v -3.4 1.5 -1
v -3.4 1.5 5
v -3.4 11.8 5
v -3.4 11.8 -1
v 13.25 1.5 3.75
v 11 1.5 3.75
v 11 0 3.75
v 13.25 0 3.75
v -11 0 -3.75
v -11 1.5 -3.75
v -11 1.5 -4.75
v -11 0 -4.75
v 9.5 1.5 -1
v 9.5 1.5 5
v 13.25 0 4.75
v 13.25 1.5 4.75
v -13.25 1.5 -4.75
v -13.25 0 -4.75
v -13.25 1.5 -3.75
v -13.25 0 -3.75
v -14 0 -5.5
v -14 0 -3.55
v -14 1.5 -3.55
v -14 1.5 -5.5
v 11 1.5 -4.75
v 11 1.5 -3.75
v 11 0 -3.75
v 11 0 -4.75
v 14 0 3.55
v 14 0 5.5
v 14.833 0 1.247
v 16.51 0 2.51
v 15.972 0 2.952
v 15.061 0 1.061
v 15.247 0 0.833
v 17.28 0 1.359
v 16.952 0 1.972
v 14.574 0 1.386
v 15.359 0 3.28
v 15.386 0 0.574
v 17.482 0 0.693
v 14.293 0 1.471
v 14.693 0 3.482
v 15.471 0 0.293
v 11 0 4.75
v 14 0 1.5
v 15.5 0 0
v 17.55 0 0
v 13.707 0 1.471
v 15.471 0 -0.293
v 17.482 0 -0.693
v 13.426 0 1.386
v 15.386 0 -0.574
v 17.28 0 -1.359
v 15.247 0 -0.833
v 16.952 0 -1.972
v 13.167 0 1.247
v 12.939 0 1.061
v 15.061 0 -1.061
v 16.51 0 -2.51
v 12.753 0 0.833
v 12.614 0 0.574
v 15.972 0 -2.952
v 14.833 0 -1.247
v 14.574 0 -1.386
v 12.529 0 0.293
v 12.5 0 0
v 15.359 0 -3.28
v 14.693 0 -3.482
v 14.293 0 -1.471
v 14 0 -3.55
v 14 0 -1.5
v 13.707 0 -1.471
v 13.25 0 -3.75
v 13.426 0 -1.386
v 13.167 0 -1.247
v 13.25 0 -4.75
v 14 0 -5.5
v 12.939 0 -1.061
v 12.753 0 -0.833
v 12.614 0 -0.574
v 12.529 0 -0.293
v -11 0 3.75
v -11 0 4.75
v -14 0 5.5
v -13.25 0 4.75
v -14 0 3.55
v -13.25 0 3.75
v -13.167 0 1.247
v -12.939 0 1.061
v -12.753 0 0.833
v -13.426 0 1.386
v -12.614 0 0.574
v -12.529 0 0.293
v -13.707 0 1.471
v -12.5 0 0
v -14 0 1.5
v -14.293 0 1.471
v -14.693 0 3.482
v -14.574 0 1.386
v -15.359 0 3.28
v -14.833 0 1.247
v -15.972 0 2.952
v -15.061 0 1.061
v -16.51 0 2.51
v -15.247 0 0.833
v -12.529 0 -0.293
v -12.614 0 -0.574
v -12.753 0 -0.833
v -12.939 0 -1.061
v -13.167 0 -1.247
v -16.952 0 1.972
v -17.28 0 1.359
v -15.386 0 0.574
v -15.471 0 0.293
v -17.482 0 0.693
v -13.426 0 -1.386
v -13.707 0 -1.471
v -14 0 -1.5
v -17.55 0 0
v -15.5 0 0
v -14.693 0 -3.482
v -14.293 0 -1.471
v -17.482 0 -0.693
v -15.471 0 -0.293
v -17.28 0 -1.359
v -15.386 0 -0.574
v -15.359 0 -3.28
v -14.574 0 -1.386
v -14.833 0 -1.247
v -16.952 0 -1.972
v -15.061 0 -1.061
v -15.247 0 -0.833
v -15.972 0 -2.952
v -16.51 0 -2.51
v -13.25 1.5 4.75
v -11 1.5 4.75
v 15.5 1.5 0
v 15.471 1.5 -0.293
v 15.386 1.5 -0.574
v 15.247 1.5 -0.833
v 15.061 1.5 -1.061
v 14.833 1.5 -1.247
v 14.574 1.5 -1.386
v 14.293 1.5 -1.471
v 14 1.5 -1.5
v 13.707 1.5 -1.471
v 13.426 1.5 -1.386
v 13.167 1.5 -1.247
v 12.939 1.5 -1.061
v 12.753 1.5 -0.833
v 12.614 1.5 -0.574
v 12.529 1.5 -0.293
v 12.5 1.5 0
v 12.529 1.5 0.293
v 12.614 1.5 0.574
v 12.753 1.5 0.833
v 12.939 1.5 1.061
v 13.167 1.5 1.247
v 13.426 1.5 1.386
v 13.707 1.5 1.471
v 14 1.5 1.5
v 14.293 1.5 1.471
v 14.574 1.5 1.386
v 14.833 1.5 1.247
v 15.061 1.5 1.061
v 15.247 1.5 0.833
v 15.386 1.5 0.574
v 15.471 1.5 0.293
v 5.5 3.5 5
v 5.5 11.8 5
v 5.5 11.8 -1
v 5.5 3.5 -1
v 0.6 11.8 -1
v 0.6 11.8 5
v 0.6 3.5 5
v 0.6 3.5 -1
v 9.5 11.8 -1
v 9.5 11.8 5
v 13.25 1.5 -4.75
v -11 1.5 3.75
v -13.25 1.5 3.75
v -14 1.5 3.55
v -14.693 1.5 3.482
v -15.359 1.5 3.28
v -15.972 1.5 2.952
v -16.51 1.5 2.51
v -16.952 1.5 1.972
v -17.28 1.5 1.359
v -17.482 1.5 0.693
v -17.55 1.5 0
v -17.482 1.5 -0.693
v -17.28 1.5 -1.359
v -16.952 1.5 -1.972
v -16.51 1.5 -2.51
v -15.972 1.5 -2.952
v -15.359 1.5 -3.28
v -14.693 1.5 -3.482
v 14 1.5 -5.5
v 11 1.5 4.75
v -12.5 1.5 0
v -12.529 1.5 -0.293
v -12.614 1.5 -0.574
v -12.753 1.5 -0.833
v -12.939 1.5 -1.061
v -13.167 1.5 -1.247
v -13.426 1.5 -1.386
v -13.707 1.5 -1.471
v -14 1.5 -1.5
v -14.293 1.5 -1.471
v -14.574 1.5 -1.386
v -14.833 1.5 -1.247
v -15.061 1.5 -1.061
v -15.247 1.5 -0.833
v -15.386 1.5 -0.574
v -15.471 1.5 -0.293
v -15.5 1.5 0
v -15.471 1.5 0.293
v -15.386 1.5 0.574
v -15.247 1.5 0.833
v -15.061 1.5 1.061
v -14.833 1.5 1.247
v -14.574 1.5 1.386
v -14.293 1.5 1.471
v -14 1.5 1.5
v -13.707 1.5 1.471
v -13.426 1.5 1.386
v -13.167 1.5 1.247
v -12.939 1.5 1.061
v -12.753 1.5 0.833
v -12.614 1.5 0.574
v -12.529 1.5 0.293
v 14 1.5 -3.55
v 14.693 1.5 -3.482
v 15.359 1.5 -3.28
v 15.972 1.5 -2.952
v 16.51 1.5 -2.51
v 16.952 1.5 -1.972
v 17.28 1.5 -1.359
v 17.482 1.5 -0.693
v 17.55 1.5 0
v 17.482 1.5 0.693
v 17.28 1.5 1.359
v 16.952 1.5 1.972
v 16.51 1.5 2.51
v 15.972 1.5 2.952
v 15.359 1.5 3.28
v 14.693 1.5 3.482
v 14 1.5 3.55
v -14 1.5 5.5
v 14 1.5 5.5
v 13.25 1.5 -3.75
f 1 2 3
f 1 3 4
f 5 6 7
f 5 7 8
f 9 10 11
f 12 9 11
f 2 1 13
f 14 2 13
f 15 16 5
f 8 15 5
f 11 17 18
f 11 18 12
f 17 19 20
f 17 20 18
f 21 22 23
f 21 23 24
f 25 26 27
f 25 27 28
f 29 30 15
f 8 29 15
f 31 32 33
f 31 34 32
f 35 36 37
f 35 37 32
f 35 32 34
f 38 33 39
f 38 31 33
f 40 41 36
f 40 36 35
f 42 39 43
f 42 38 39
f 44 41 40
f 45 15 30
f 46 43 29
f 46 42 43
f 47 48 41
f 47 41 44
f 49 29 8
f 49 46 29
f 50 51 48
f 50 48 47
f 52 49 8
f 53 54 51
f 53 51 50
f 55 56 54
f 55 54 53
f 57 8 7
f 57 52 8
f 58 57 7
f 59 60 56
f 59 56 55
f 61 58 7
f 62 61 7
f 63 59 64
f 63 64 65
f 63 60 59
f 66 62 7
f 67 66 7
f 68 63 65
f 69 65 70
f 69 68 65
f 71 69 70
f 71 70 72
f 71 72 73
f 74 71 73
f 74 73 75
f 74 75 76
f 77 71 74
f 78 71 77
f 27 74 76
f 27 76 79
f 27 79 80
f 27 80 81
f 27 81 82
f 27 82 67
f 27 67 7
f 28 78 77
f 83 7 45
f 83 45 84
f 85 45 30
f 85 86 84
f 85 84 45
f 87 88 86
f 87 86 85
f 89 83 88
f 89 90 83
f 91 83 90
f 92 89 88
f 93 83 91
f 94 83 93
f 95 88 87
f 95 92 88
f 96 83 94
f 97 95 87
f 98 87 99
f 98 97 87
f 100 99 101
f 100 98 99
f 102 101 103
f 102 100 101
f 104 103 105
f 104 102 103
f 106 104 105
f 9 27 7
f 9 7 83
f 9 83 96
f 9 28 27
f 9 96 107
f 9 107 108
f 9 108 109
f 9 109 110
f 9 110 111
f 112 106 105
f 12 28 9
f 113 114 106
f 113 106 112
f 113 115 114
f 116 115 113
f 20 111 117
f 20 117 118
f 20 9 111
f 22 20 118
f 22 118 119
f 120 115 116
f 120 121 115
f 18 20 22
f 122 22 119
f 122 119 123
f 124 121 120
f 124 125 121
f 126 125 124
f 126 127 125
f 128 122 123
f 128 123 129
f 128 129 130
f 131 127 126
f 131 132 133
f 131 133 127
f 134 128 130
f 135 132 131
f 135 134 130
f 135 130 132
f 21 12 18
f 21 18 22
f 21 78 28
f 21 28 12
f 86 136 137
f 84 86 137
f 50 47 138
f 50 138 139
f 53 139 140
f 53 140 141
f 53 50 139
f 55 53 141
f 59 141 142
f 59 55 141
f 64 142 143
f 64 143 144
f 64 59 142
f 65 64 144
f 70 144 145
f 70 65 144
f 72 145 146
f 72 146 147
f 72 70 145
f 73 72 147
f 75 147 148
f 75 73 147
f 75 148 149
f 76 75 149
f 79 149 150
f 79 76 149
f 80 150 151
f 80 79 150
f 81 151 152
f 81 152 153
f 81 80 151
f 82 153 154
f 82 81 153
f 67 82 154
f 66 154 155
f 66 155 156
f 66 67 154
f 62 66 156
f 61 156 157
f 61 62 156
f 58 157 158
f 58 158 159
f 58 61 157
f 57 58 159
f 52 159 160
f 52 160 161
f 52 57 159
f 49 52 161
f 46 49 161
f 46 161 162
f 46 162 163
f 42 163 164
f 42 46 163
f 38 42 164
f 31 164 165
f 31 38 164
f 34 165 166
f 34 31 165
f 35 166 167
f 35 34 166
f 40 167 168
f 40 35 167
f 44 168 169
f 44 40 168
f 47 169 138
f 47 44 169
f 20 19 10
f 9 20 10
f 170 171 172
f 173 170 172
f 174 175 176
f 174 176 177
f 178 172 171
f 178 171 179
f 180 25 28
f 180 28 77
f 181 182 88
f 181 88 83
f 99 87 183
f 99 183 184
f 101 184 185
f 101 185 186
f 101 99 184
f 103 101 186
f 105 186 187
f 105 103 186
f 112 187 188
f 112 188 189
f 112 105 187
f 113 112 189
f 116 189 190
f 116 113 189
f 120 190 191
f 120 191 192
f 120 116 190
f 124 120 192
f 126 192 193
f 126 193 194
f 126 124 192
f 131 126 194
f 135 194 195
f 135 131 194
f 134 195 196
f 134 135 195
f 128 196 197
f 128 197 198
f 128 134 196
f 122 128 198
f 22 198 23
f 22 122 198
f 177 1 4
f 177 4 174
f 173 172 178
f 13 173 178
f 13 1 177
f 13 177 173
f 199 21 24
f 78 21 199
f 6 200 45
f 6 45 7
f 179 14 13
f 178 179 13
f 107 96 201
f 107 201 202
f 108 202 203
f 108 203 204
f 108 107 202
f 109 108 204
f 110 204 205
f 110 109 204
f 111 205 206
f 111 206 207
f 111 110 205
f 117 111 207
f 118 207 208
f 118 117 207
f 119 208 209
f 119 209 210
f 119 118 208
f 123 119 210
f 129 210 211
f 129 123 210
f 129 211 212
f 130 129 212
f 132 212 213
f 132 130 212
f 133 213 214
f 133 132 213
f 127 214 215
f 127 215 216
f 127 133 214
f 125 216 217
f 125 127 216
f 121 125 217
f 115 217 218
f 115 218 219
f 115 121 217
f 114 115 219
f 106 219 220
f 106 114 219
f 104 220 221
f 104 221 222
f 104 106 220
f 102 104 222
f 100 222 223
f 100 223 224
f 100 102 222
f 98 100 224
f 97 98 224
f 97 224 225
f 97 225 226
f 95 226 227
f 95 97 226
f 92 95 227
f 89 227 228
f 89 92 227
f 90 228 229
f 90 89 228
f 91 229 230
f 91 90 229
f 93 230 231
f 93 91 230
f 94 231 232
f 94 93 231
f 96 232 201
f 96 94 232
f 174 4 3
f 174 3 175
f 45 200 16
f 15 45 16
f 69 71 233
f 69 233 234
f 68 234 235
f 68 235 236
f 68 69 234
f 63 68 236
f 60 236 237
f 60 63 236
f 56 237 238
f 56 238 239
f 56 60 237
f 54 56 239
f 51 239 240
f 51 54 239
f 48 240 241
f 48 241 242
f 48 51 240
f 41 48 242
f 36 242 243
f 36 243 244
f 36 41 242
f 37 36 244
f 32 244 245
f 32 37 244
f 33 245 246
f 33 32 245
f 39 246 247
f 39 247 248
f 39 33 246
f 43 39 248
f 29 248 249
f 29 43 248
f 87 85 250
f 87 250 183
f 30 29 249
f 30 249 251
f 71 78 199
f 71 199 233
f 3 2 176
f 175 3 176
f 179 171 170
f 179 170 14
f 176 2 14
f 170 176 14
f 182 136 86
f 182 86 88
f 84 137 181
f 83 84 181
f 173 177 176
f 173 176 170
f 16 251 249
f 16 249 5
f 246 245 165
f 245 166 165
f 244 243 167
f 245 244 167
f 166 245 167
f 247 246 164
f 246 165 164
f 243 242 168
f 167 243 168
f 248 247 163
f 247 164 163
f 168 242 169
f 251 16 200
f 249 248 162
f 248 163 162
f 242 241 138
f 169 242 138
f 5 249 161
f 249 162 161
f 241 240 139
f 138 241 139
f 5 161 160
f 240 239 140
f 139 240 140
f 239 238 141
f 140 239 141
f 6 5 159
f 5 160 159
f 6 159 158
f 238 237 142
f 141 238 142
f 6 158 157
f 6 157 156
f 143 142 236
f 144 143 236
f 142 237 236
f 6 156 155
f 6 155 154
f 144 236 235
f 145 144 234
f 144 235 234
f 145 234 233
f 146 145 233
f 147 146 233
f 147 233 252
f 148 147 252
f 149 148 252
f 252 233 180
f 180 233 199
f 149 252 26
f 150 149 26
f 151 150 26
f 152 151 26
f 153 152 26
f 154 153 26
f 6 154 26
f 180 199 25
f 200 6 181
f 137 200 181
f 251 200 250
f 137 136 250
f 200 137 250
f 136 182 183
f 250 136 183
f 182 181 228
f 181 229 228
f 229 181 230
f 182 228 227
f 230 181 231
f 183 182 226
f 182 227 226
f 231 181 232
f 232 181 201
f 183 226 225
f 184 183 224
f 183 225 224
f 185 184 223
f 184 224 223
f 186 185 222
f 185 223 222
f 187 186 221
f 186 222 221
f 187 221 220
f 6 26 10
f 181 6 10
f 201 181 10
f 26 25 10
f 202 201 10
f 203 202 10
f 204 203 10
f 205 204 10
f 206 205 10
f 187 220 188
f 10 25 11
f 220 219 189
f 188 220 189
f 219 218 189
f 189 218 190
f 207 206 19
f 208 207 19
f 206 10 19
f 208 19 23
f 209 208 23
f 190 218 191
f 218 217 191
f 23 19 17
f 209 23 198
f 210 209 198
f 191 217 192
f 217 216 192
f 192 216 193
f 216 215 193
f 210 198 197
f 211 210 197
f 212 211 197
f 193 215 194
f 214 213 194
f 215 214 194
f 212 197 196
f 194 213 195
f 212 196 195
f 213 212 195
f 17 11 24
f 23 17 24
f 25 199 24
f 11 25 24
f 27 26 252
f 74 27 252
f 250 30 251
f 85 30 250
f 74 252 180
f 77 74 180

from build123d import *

# Parameters (mm, degrees)
SKETCH1_R         = 1.5
PCB_DEPTH         = 1.5
SKETCH2_W         = 2.25
SKETCH2_H         = 1
TAB_SLOTS_DEPTH   = 2.5
SKETCH3_W         = 12.9
SKETCH3_H         = 6
SENSOR_BODY_DEPTH = 10.3
SKETCH4_W         = 4.9
SKETCH4_H         = 6
SENSOR_SLOT_DEPTH = 8.3


with BuildPart() as part:
    # Sketch1 → PCB (new body)
    with BuildSketch(Plane(origin=(0, 0, 0), x_dir=(1, 0, 0), z_dir=(0, 1, 0))):
        with BuildLine():
            Line((-14, 3.55), (-14, 5.5))
            Line((-14, 5.5), (14, 5.5))
            Line((14, 5.5), (14, 3.55))
            ThreePointArc((14, 3.55), (17.55, 0), (14, -3.55))
            Line((14, -3.55), (14, -5.5))
            Line((14, -5.5), (-14, -5.5))
            Line((-14, -5.5), (-14, -3.55))
            ThreePointArc((-14, -3.55), (-17.55, 0), (-14, 3.55))
        make_face()
        with Locations((-14, 0)):
            Circle(SKETCH1_R, mode=Mode.SUBTRACT)
        with Locations((14, 0)):
            Circle(SKETCH1_R, mode=Mode.SUBTRACT)
    extrude(amount=PCB_DEPTH)

    # Sketch2 → Tab Slots (cut, through all)
    with BuildSketch(Plane(origin=(0, 1.5, 0), x_dir=(1, 0, 0), z_dir=(0, 1, 0))):
        with Locations((-12.125, -4.25)):
            Rectangle(SKETCH2_W, SKETCH2_H)
        with Locations((-12.125, 4.25)):
            Rectangle(SKETCH2_W, SKETCH2_H)
        with Locations((12.125, 4.25)):
            Rectangle(SKETCH2_W, SKETCH2_H)
        with Locations((12.125, -4.25)):
            Rectangle(SKETCH2_W, SKETCH2_H)
    extrude(amount=-TAB_SLOTS_DEPTH, mode=Mode.SUBTRACT)


with BuildPart() as body_2:
    # Sketch3 → Sensor Body (new body)
    with BuildSketch(Plane(origin=(0, 1.5, 0), x_dir=(1, 0, 0), z_dir=(0, 1, 0))):
        with Locations((3.05, -2)):
            Rectangle(SKETCH3_W, SKETCH3_H)
    extrude(amount=SENSOR_BODY_DEPTH)

    # Sketch4 → Sensor Slot (cut)
    with BuildSketch(Plane(origin=(0, 11.8, 0), x_dir=(1, 0, 0), z_dir=(0, 1, 0))):
        with Locations((3.05, -2)):
            Rectangle(SKETCH4_W, SKETCH4_H)
    extrude(amount=-SENSOR_SLOT_DEPTH, mode=Mode.SUBTRACT)


solid = Compound([part.part, body_2.part])
